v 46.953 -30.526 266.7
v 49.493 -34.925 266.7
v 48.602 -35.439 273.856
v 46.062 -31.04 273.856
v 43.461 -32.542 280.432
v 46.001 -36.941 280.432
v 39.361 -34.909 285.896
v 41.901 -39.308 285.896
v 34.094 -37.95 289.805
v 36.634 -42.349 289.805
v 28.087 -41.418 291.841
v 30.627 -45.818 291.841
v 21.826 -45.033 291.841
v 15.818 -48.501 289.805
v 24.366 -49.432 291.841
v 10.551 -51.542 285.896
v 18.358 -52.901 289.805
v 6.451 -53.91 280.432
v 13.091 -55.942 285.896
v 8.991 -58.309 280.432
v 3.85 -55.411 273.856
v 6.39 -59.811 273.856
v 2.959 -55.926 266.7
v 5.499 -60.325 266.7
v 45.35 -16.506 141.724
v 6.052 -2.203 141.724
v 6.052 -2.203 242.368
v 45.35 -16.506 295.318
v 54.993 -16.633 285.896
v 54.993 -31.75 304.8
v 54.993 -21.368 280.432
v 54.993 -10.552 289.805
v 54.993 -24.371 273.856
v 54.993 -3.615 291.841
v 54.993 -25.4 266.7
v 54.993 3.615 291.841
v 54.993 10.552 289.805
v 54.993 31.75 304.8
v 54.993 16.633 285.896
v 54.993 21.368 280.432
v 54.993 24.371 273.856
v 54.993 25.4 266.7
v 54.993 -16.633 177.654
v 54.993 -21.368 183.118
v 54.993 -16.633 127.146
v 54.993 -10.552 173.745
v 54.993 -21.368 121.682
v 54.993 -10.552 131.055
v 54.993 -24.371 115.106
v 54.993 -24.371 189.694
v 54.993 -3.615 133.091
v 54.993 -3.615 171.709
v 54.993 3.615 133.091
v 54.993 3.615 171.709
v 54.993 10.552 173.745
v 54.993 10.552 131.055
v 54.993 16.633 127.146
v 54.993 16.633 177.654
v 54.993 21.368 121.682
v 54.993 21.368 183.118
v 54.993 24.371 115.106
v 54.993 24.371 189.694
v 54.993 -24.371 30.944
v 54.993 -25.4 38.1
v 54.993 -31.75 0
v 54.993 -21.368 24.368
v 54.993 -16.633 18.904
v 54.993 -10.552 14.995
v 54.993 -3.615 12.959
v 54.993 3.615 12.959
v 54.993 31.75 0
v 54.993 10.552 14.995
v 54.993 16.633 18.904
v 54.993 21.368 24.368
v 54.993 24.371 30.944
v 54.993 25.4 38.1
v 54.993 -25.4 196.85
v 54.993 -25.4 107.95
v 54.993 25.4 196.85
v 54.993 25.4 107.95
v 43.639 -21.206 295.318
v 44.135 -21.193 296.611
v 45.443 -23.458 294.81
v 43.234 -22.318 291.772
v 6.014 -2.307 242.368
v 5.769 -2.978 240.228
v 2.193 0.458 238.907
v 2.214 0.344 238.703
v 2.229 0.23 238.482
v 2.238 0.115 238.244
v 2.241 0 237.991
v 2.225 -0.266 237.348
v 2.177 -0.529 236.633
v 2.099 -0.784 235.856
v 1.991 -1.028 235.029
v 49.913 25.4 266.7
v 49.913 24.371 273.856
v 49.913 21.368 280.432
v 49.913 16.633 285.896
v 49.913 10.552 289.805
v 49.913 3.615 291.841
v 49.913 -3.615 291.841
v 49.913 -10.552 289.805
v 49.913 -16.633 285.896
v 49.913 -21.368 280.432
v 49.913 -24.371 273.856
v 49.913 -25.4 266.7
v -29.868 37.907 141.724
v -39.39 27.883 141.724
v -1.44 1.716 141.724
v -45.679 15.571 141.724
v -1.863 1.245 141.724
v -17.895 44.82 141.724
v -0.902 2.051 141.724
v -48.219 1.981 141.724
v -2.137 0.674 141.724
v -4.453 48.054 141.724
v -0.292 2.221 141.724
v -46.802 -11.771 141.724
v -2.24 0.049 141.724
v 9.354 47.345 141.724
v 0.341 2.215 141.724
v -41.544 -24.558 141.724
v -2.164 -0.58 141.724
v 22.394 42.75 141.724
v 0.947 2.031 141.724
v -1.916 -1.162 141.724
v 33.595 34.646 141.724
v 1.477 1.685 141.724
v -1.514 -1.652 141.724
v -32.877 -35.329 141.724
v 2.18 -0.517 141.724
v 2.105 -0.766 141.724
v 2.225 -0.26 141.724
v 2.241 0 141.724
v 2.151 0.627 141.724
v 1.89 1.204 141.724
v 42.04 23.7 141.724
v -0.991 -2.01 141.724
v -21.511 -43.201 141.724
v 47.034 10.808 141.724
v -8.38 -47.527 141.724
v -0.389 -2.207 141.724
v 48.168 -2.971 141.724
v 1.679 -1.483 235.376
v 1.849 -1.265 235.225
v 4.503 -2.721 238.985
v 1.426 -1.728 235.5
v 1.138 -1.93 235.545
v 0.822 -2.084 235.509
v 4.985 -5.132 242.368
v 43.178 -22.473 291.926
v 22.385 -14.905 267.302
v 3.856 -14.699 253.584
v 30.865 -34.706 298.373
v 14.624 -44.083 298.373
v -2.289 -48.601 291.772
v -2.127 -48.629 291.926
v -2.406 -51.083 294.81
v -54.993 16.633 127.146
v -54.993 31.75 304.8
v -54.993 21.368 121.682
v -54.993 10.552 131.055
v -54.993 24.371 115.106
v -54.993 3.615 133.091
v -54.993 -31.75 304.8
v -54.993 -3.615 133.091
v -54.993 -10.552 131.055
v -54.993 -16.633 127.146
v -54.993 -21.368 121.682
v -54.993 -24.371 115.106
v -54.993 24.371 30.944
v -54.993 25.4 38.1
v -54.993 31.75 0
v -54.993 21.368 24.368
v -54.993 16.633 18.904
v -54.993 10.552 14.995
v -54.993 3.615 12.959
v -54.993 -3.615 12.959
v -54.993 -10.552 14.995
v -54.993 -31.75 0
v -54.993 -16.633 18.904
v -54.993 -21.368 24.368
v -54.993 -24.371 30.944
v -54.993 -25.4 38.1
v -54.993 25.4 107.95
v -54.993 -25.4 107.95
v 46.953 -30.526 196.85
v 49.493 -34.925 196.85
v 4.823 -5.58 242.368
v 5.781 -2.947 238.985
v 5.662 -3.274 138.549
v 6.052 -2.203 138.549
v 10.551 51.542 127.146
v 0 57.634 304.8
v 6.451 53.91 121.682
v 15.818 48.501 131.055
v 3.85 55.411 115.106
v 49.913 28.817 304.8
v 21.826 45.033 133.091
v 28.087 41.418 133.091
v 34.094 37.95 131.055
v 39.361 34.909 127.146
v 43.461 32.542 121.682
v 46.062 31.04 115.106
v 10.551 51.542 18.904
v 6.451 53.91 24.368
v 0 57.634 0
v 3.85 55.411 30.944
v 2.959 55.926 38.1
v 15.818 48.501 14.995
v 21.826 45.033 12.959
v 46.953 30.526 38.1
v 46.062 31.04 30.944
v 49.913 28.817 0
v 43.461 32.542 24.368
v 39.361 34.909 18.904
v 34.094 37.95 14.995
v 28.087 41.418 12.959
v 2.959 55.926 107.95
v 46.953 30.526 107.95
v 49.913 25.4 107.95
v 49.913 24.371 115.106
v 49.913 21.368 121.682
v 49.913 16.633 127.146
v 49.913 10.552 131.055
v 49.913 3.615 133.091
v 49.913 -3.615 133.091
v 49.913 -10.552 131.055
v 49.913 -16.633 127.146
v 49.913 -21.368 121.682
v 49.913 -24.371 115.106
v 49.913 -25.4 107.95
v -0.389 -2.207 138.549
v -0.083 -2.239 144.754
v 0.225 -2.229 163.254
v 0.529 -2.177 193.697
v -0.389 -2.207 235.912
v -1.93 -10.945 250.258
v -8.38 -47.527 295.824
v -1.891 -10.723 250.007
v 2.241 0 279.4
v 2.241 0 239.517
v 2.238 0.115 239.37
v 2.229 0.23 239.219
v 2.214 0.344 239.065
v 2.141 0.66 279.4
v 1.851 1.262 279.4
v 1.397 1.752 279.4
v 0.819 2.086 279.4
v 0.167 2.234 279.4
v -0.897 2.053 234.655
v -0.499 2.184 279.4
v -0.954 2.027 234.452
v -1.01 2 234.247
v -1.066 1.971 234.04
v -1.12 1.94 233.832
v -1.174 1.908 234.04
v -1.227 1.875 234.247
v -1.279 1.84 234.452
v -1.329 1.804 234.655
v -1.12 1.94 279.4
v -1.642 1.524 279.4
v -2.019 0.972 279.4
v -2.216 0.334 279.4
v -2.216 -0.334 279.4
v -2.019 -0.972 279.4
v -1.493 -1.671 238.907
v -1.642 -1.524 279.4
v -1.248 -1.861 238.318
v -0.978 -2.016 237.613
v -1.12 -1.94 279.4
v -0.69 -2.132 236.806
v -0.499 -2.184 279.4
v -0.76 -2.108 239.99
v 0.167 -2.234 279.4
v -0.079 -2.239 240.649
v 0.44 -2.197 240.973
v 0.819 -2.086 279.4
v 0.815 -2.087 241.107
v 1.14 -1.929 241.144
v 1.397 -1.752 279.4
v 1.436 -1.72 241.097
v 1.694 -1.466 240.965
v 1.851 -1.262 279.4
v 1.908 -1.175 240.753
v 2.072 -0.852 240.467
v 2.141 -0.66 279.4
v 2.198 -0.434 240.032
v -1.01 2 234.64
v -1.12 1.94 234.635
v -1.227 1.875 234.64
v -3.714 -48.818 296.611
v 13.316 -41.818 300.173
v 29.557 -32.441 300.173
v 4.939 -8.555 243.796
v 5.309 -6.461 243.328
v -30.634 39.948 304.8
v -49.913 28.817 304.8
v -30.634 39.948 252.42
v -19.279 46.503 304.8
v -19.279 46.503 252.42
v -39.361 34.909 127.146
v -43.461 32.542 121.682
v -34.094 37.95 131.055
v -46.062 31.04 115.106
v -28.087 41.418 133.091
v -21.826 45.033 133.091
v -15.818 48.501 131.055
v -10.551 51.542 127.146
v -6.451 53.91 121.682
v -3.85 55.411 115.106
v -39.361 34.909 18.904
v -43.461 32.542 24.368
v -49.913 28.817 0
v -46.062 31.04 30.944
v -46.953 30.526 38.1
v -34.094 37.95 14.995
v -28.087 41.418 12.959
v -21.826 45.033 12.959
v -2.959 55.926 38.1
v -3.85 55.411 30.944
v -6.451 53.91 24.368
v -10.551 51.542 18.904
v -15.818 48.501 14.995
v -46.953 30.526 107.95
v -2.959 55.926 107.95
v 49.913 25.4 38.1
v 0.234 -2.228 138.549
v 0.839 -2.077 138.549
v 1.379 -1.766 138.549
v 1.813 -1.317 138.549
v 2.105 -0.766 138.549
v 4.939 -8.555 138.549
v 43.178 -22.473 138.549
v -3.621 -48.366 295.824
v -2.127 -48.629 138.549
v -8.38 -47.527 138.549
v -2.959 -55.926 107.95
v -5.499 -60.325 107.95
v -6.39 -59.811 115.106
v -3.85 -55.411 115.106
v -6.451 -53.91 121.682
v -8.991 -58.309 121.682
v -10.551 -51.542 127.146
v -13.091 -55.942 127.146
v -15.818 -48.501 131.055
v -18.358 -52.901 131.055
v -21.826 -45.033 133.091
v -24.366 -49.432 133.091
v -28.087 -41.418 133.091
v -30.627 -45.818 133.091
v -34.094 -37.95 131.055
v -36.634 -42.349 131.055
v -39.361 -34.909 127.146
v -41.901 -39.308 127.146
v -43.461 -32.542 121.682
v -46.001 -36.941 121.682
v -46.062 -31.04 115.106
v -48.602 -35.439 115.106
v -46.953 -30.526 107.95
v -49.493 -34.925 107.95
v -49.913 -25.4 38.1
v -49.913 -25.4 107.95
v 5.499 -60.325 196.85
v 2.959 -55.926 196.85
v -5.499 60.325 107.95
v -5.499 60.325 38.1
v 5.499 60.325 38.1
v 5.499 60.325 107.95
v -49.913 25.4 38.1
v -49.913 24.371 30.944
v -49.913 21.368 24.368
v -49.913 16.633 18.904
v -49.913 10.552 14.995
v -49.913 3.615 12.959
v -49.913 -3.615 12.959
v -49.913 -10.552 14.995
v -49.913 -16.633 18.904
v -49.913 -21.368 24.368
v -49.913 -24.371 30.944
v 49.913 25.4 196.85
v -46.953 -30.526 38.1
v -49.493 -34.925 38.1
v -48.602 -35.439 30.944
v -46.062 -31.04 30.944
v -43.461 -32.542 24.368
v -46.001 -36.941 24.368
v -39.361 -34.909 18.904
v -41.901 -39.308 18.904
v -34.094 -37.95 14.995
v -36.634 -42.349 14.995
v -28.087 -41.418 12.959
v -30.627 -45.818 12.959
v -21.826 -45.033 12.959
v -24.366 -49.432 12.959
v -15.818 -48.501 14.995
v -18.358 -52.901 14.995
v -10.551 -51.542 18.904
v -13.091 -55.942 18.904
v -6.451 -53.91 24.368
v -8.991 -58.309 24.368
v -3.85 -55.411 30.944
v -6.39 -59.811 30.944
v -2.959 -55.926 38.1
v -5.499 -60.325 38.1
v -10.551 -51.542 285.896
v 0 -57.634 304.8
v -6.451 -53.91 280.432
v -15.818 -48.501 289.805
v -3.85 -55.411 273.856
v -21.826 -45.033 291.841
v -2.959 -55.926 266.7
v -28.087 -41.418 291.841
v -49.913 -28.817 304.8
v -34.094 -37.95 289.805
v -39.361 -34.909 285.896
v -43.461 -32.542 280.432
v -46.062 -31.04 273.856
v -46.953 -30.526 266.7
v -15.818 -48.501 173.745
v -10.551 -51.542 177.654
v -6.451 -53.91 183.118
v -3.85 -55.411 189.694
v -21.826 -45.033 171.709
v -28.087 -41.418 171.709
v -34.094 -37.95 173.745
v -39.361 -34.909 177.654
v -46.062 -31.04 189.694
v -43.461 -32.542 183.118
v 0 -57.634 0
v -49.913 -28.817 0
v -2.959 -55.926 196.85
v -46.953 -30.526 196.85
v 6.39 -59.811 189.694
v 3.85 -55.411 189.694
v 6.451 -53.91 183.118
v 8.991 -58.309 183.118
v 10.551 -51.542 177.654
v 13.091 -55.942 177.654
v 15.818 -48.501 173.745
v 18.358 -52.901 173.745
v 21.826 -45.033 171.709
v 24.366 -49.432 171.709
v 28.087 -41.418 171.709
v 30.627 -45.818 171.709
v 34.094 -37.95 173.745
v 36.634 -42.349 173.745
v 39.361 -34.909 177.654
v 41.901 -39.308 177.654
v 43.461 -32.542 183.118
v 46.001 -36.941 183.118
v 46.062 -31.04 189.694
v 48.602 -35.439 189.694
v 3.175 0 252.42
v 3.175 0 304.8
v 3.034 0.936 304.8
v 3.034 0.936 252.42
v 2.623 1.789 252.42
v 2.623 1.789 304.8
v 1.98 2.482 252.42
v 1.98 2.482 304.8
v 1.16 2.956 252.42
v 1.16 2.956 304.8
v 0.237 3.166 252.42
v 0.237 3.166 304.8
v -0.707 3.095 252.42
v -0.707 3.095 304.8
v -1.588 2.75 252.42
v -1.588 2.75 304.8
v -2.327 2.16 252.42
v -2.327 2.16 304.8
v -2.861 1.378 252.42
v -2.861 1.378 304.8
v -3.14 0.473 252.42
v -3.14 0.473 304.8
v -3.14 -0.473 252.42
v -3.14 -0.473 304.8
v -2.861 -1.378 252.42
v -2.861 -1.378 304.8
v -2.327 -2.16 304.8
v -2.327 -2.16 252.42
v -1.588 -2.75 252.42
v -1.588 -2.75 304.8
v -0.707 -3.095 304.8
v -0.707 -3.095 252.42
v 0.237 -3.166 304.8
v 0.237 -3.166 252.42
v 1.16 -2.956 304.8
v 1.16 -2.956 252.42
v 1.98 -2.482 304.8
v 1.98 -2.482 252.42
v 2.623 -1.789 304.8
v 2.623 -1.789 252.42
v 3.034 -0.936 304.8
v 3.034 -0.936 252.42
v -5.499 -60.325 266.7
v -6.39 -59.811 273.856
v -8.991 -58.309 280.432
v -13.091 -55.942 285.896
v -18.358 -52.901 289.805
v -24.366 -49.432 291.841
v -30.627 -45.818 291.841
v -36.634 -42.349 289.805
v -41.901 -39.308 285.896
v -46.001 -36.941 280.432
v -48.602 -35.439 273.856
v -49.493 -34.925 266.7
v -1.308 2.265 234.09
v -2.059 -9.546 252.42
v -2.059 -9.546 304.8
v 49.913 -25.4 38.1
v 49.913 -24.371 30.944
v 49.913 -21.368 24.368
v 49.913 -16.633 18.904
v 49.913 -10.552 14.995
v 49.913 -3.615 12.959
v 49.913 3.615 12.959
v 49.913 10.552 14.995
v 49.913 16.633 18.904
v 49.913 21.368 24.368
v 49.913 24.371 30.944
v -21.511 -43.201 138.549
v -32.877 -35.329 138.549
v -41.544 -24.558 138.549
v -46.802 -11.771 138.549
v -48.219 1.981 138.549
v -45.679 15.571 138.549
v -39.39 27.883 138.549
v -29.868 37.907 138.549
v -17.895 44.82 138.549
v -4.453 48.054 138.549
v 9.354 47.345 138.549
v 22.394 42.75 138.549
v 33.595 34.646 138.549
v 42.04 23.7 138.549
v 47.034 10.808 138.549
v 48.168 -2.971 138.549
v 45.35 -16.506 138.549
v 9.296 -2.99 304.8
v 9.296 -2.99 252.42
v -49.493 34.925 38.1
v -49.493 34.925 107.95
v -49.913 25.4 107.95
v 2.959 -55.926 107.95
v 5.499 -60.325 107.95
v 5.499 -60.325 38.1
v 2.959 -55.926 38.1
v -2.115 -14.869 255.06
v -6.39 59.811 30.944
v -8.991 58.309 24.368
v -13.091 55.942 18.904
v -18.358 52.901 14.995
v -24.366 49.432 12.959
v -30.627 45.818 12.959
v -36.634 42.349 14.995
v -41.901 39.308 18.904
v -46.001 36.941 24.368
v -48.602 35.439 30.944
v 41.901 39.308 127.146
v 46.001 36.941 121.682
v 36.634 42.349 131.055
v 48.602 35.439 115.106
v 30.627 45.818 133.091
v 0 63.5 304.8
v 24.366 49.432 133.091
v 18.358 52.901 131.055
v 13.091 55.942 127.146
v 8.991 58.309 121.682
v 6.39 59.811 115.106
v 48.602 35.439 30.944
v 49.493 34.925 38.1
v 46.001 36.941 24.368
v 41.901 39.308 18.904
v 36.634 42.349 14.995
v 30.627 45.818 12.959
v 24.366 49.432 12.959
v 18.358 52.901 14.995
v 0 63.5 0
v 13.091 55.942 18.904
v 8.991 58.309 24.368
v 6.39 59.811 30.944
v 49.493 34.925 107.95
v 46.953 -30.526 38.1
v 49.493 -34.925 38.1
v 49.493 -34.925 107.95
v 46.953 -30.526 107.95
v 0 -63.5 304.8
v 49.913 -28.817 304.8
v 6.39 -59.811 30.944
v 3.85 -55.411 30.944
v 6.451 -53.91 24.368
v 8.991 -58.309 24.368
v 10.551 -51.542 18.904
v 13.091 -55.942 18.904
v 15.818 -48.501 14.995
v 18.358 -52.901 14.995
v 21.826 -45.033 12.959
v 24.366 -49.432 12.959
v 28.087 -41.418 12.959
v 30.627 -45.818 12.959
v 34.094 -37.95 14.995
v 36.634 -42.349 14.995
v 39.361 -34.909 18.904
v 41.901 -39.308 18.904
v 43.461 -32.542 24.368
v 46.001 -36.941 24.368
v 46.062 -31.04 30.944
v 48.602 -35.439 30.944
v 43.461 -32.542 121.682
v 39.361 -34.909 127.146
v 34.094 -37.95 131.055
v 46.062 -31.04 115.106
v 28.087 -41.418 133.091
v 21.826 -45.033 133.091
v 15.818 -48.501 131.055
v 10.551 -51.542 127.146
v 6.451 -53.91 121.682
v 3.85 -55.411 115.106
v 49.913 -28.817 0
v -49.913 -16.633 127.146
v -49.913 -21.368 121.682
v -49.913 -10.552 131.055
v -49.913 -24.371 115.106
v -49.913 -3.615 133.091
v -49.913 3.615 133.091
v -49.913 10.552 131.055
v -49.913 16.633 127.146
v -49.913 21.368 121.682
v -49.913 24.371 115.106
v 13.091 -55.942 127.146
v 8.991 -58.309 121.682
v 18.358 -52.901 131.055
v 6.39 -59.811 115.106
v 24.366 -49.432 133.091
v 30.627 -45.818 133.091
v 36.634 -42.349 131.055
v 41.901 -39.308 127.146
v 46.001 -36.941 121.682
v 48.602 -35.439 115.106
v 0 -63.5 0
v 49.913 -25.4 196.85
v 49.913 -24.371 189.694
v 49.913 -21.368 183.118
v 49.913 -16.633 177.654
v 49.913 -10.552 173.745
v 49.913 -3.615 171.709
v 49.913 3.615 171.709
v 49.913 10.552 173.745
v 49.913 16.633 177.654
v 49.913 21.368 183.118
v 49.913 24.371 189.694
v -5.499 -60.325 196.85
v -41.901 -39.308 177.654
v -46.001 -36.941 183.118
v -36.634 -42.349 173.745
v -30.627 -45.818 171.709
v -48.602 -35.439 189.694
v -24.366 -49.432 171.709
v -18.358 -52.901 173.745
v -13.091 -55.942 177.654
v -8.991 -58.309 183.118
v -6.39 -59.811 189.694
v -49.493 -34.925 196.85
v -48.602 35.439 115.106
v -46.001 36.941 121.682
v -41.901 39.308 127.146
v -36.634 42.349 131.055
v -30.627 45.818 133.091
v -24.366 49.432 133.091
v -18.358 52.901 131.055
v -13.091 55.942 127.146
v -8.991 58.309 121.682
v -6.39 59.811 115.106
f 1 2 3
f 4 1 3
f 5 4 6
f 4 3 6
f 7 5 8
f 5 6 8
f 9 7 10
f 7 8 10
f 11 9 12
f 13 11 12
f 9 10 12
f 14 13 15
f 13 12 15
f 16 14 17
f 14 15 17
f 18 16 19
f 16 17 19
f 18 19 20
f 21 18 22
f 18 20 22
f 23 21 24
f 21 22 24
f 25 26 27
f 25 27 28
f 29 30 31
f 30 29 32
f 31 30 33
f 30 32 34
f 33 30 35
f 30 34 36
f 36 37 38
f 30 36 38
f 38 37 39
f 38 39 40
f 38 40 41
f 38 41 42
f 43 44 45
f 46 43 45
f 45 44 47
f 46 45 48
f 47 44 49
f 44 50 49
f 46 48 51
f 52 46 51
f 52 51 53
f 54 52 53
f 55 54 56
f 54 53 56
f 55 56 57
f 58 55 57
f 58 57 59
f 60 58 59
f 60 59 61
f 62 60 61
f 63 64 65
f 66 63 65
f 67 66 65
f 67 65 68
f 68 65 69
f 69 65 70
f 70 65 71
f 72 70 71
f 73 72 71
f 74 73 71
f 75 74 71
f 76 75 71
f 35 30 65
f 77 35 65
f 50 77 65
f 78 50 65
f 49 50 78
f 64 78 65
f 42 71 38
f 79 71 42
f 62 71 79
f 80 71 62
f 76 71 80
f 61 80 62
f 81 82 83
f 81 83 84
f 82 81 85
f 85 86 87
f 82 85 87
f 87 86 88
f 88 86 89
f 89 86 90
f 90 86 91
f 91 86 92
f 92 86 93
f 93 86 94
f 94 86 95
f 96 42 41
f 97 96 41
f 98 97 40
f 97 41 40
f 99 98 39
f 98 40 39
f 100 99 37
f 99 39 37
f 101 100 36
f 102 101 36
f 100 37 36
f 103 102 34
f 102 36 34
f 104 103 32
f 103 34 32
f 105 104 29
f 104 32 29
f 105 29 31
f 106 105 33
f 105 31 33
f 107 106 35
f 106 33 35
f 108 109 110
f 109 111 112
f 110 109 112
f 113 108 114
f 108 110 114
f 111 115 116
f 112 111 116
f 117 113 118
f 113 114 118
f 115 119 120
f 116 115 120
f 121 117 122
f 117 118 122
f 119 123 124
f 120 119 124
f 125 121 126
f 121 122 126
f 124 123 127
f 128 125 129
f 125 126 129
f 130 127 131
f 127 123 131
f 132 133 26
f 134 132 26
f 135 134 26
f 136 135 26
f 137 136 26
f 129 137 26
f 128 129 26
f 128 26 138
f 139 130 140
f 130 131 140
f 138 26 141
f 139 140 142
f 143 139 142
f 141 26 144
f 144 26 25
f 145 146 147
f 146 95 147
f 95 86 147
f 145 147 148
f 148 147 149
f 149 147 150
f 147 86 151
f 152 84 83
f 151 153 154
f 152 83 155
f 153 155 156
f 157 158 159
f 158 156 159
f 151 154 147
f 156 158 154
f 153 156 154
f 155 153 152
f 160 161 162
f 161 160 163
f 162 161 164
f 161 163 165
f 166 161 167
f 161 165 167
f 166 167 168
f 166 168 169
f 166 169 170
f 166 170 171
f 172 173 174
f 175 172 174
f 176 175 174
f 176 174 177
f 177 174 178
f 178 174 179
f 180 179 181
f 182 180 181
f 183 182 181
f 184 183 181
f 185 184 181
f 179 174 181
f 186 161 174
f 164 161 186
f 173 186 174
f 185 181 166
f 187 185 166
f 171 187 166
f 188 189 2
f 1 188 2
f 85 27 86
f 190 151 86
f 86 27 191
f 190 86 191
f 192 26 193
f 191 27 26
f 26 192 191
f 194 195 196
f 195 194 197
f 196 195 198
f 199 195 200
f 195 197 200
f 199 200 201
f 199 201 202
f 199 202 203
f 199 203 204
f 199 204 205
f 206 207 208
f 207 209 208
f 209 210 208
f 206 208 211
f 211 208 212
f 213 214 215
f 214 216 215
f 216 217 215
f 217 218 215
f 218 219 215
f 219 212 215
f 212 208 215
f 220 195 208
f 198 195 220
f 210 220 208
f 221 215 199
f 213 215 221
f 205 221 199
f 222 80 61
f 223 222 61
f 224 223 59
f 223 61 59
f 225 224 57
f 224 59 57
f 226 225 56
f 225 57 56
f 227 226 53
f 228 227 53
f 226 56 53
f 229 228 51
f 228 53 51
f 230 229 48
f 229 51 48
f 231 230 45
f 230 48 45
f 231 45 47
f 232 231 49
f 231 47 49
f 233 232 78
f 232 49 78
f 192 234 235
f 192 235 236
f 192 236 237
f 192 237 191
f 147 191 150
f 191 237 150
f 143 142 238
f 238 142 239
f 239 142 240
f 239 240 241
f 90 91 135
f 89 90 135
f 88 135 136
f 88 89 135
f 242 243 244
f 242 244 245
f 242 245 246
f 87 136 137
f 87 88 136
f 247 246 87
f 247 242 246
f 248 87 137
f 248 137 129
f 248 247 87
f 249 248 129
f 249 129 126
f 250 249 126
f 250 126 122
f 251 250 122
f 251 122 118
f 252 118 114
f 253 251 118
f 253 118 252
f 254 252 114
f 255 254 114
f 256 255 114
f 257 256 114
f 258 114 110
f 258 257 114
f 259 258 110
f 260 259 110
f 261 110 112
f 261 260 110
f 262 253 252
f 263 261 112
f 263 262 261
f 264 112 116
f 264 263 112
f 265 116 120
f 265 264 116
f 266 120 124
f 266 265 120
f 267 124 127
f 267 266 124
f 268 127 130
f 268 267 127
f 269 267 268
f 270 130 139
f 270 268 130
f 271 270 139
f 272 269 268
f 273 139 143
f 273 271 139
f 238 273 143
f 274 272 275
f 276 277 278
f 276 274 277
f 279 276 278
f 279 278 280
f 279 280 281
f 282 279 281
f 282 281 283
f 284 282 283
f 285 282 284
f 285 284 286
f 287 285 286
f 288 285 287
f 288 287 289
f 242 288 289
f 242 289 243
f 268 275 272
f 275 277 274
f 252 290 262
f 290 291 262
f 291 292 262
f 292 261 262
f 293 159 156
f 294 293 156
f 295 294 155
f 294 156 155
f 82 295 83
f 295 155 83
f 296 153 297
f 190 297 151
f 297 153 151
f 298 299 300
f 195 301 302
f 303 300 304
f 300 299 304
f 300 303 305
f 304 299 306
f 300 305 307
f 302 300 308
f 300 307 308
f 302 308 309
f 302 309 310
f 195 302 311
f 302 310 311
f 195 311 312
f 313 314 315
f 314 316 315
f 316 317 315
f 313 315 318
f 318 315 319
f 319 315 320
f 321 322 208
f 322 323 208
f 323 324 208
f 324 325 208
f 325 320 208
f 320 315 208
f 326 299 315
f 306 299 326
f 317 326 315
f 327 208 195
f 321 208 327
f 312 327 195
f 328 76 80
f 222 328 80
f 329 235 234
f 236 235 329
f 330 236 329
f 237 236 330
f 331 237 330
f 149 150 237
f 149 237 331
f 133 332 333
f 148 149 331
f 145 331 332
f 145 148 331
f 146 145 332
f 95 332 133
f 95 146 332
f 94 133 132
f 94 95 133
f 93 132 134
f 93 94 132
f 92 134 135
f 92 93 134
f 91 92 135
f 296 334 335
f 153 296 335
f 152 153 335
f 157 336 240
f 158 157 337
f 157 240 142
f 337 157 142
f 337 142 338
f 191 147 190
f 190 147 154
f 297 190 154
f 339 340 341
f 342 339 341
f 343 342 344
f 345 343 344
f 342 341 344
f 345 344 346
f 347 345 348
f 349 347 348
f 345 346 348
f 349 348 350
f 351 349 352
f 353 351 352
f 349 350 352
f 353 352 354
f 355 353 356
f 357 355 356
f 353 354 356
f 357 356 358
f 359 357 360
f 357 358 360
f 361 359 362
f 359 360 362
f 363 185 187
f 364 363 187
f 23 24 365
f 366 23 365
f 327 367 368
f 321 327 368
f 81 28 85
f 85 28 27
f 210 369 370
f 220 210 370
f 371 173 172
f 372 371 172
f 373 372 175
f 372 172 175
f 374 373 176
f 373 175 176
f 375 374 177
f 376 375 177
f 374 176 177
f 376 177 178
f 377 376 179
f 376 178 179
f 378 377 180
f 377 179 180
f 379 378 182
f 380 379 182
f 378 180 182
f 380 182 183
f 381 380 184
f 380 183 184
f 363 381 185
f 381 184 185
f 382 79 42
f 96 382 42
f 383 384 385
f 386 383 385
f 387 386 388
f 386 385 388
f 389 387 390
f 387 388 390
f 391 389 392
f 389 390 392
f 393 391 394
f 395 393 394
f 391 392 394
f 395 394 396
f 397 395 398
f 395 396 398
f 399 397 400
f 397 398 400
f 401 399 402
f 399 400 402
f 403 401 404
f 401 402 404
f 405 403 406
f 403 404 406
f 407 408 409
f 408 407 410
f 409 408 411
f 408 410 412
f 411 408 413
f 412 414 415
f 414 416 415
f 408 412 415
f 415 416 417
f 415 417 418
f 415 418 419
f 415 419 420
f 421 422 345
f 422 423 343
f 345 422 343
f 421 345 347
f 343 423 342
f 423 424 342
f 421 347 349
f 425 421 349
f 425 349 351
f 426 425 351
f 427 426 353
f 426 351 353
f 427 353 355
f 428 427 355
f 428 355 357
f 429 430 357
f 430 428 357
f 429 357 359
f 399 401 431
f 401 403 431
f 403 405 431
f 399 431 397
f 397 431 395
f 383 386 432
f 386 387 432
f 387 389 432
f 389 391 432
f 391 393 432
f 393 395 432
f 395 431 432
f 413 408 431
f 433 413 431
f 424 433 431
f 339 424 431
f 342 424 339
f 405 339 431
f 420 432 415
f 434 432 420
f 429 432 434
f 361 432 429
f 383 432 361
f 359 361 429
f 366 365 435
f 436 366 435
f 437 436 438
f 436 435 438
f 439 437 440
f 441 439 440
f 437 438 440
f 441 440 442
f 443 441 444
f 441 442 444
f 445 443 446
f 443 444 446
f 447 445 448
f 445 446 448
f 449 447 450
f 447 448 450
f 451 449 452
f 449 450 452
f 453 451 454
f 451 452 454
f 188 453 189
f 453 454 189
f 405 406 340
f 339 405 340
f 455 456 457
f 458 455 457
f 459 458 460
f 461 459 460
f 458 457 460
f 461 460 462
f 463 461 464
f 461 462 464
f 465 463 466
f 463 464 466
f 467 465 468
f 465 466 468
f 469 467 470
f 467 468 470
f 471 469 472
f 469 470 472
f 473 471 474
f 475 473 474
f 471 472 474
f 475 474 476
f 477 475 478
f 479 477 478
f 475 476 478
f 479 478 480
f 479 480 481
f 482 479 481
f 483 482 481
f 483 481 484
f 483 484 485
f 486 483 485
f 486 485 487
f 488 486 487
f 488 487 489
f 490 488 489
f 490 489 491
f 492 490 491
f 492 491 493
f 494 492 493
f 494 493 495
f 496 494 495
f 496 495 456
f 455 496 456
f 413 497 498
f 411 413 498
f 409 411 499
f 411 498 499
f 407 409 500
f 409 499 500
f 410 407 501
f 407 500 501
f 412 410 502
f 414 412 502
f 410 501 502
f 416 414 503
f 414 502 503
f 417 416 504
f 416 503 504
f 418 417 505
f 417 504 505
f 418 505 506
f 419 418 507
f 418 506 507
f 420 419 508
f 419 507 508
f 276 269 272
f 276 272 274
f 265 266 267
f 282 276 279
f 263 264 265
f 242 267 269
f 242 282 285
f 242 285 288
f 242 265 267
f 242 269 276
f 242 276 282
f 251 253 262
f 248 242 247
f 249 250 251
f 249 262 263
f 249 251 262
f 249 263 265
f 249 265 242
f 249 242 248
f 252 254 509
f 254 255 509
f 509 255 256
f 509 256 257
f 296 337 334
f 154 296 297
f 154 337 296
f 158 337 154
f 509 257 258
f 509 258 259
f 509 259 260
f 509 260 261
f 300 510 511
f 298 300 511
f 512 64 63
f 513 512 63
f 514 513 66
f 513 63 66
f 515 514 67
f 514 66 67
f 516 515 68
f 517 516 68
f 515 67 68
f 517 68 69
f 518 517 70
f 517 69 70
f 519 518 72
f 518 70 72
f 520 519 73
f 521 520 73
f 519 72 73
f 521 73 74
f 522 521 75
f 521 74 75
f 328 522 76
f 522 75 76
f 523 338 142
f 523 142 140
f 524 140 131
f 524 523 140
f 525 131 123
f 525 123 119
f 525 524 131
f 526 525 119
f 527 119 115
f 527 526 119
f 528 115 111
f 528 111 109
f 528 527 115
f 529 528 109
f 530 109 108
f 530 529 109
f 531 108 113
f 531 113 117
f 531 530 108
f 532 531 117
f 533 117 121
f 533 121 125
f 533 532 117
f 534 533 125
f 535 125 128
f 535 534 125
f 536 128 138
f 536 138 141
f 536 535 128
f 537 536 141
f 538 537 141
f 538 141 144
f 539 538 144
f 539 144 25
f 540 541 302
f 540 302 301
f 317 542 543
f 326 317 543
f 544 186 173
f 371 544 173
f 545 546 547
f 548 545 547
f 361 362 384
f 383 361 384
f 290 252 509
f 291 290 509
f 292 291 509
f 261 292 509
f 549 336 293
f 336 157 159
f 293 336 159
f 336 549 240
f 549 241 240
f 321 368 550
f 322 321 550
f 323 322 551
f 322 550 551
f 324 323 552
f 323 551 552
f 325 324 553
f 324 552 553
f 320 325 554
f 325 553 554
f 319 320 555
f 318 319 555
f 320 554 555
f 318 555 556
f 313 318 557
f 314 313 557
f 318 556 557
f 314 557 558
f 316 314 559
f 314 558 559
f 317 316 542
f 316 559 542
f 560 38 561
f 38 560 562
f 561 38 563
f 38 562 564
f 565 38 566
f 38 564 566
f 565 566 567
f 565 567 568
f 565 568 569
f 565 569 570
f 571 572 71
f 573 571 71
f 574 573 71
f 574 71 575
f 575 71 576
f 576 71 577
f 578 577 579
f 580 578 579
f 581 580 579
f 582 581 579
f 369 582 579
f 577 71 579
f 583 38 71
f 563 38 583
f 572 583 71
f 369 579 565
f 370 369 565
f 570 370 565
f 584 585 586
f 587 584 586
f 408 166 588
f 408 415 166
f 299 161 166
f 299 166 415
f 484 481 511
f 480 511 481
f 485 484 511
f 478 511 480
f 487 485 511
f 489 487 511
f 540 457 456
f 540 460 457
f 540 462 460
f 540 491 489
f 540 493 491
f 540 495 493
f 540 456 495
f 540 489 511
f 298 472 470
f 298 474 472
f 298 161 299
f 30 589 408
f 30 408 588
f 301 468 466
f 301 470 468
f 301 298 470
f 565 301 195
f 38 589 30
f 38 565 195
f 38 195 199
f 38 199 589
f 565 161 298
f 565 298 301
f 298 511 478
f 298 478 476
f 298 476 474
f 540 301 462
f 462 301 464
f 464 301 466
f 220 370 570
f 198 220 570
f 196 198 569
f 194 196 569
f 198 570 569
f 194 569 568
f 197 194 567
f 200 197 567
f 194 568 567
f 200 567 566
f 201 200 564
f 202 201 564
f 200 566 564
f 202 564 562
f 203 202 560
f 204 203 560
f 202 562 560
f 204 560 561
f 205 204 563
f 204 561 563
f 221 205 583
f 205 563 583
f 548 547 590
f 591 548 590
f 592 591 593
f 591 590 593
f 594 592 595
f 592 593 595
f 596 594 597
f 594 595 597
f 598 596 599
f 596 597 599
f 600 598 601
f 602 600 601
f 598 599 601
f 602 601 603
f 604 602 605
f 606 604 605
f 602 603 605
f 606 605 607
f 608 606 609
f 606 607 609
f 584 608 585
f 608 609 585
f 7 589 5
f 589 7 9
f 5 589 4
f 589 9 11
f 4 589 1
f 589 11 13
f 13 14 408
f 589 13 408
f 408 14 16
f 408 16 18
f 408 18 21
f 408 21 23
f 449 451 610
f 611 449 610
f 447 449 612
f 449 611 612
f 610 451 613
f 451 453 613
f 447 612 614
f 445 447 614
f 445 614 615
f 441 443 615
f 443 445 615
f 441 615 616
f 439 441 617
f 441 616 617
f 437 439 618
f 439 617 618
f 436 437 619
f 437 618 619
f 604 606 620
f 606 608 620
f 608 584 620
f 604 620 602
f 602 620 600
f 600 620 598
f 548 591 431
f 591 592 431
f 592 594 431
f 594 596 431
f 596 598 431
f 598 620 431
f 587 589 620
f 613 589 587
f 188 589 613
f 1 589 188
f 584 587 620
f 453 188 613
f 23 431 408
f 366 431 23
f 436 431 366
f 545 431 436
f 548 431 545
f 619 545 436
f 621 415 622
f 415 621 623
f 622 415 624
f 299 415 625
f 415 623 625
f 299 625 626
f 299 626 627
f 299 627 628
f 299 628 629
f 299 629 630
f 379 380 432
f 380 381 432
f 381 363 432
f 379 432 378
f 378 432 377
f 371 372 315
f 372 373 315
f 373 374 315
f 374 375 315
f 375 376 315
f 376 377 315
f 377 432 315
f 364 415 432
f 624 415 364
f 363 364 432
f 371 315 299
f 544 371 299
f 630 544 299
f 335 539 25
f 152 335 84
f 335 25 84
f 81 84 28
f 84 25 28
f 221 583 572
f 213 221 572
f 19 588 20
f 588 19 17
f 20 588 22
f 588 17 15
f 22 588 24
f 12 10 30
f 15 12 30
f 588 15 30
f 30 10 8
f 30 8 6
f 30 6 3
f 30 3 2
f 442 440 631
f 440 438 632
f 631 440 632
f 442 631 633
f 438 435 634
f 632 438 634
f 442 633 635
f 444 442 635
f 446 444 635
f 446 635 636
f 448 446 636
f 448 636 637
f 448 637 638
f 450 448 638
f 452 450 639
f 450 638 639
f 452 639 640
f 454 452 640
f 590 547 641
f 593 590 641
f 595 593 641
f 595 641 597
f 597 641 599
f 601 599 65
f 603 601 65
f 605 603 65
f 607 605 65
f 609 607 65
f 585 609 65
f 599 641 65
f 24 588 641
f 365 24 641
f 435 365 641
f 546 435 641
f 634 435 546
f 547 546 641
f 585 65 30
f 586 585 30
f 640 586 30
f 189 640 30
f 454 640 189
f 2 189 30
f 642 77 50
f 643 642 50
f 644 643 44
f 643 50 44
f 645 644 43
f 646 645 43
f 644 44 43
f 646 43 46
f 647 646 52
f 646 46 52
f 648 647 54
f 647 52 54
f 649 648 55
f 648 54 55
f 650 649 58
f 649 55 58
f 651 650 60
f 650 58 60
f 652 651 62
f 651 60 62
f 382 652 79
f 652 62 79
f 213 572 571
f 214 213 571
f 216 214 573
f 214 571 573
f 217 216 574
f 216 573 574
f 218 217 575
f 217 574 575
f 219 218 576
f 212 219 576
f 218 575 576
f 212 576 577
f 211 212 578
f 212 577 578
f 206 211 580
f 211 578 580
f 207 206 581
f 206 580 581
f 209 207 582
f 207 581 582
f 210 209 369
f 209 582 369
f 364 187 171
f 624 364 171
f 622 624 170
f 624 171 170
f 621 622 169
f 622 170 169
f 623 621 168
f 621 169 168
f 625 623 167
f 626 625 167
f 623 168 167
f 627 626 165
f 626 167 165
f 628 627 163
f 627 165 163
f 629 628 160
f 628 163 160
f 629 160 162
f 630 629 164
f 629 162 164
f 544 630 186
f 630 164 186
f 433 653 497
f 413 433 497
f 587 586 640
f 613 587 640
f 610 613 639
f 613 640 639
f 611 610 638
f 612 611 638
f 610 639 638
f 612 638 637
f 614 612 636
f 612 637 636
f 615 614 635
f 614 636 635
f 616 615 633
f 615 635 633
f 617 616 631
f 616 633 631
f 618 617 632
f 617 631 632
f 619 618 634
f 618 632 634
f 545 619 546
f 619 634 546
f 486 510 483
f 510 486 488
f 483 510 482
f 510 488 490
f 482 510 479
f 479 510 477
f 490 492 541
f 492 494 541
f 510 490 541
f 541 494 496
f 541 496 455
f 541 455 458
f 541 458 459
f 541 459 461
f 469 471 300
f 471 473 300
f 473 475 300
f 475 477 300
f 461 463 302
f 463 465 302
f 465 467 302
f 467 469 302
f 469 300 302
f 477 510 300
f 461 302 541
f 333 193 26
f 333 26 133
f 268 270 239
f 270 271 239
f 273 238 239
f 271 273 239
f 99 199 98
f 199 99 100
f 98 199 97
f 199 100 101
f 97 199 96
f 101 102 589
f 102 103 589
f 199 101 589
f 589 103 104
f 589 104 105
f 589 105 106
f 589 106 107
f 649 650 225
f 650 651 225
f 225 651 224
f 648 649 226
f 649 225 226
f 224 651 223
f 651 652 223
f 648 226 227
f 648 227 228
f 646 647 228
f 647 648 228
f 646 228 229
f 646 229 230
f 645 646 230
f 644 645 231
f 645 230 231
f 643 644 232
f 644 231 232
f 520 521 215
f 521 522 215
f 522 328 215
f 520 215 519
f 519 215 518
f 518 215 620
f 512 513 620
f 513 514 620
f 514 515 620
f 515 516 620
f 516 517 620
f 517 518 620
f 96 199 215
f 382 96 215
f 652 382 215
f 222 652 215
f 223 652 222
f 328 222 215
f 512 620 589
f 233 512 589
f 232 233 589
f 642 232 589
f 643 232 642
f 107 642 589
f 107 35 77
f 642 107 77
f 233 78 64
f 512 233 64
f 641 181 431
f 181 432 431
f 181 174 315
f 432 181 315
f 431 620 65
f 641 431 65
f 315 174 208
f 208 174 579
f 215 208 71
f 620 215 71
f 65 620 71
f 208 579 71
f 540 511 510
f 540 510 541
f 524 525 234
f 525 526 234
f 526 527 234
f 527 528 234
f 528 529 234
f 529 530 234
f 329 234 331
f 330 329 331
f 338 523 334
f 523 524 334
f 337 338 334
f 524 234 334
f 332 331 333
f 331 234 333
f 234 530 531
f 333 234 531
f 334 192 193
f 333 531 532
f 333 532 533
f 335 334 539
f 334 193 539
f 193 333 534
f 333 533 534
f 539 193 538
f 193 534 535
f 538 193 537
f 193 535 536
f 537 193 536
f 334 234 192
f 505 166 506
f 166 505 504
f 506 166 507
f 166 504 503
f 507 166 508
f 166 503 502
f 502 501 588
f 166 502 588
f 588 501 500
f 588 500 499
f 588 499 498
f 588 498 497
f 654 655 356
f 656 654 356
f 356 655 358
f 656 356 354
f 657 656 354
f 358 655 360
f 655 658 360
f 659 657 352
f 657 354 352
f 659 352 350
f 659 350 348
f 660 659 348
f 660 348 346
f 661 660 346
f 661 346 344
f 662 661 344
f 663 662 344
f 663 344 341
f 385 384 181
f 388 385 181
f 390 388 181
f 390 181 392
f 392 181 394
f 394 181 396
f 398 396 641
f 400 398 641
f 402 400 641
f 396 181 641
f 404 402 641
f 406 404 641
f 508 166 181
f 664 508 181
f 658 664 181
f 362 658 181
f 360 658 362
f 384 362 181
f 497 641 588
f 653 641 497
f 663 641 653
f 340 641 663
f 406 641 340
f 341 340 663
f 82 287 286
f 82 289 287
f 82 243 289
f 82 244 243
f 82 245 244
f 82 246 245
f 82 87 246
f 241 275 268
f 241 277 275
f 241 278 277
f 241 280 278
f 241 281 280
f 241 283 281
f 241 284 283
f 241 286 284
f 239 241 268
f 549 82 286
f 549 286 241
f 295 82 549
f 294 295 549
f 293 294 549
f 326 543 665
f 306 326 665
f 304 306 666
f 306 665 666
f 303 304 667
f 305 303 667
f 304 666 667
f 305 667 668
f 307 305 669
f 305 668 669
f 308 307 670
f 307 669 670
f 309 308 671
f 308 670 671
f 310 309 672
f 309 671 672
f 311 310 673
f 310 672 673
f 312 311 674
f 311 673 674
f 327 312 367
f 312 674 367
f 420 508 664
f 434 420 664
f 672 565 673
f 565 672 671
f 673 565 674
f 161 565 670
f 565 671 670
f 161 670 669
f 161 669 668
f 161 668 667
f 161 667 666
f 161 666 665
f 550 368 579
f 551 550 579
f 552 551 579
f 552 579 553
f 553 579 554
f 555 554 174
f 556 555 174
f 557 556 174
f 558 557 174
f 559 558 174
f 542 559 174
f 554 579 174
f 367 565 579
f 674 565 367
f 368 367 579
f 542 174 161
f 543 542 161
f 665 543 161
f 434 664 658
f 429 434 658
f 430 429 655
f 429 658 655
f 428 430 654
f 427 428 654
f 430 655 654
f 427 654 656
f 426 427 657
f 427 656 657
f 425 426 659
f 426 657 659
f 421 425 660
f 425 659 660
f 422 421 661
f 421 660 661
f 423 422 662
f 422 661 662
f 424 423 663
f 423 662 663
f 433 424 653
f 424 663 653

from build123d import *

# Parameters (mm, degrees)
F1_DEPTH  = 304.8
F7_DEPTH  = 3.175
F8_W      = 13.1115056574
F8_H      = 52.3799322128
F9_DEPTH  = 57.15
F10_R     = 3.175
F11_DEPTH = 304.801
F13_START = -25.4
F12_R     = 2.2405859804
F13_DEPTH = 140.85123
F15_DEPTH = 5.08
F17_DEPTH = 5.08
F19_DEPTH = 5.08
F21_DEPTH = 3.175
F23_DEPTH = 6.35
F25_DEPTH = 6.35
F27_DEPTH = 5.08
F29_DEPTH = 5.08
F31_DEPTH = 5.08


with BuildPart() as f1:
    # F0 (on Top) → F1 (new body)
    with BuildSketch(Plane.XY):
        Polygon((-54.9926131403, 31.75), (-54.9926131403, 0), (-54.9926131403, -31.75), (0, -63.5), (54.9926131403, -31.75), (54.9926131403, 0), (54.9926131403, 31.75), (0, 63.5), align=None)
        Polygon((-49.9126131403, -28.8170606325), (-49.9126131403, 0), (-49.9126131403, 28.8170606325), (0, 57.634121265), (49.9126131403, 28.8170606325), (49.9126131403, 0), (49.9126131403, -28.8170606325), (0, -57.634121265), align=None, mode=Mode.SUBTRACT)
    extrude(amount=F1_DEPTH)

    # F8 (on face) → F9 (join)
    with BuildSketch(Plane(origin=(-24.9563065702, 43.2255909488, 0), x_dir=(0.8660254038, 0.5, 0), z_dir=(0.5, -0.8660254038, 0))):
        with Locations((0, 278.6100338936)):
            Rectangle(F8_W, F8_H)
    extrude(amount=F9_DEPTH)

    # F10 (on face) → F11 (cut, through all)
    with BuildSketch(Plane.XY.offset(304.8)):
        Circle(F10_R)
    extrude(amount=-F11_DEPTH, mode=Mode.SUBTRACT)

    # F14 (on face) → F15 (cut, through all)
    with BuildSketch(Plane.YZ.offset(54.9926131403)):
        with BuildLine():
            ThreePointArc((25.4, 266.7), (0, 292.1), (-25.4, 266.7))
            Line((-25.4, 266.7), (-25.4, 196.85))
            ThreePointArc((-25.4, 196.85), (0, 171.45), (25.4, 196.85))
            Line((25.4, 196.85), (25.4, 266.7))
        make_face()
        with BuildLine():
            ThreePointArc((25.4, 107.95), (0, 133.35), (-25.4, 107.95))
            Line((-25.4, 107.95), (-25.4, 38.1))
            ThreePointArc((-25.4, 38.1), (0, 12.7), (25.4, 38.1))
            Line((25.4, 38.1), (25.4, 107.95))
        make_face()
    extrude(amount=-F15_DEPTH, mode=Mode.SUBTRACT)

    # F16 (on face) → F17 (cut, through all)
    with BuildSketch(Plane(origin=(27.4963065702, -47.625, 0), x_dir=(0.8660254038, 0.5, 0), z_dir=(0.5, -0.8660254038, 0))):
        with BuildLine():
            ThreePointArc((25.4, 266.7), (0, 292.1), (-25.4, 266.7))
            Line((-25.4, 266.7), (-25.4, 196.85))
            ThreePointArc((-25.4, 196.85), (0, 171.45), (25.4, 196.85))
            Line((25.4, 196.85), (25.4, 266.7))
        make_face()
        with BuildLine():
            Line((25.4, 38.1), (25.4, 107.95))
            ThreePointArc((25.4, 107.95), (0, 133.35), (-25.4, 107.95))
            Line((-25.4, 107.95), (-25.4, 38.1))
            ThreePointArc((-25.4, 38.1), (0, 12.7), (25.4, 38.1))
        make_face()
    extrude(amount=-F17_DEPTH, mode=Mode.SUBTRACT)

    # F18 (on face) → F19 (cut, through all)
    with BuildSketch(Plane(origin=(-27.4963065702, -47.625, 0), x_dir=(0.8660254038, -0.5, 0), z_dir=(-0.5, -0.8660254038, 0))):
        with BuildLine():
            ThreePointArc((25.4, 266.7), (0, 292.1), (-25.4, 266.7))
            Line((-25.4, 266.7), (-25.4, 196.85))
            ThreePointArc((-25.4, 196.85), (0, 171.45), (25.4, 196.85))
            Line((25.4, 196.85), (25.4, 266.7))
        make_face()
        with BuildLine():
            ThreePointArc((25.4, 107.95), (0, 133.35), (-25.4, 107.95))
            Line((-25.4, 107.95), (-25.4, 38.1))
            ThreePointArc((-25.4, 38.1), (0, 12.7), (25.4, 38.1))
            Line((25.4, 38.1), (25.4, 107.95))
        make_face()
    extrude(amount=-F19_DEPTH, mode=Mode.SUBTRACT)

    # F26 (on face) → F27 (cut, through all)
    with BuildSketch(Plane(origin=(27.4963065702, 47.625, 0), x_dir=(-0.8660254038, 0.5, 0), z_dir=(0.5, 0.8660254038, 0))):
        with BuildLine():
            ThreePointArc((25.4, 107.95), (0, 133.35), (-25.4, 107.95))
            Line((-25.4, 107.95), (-25.4, 38.1))
            ThreePointArc((-25.4, 38.1), (0, 12.7), (25.4, 38.1))
            Line((25.4, 38.1), (25.4, 107.95))
        make_face()
    extrude(amount=-F27_DEPTH, mode=Mode.SUBTRACT)

    # F28 (on face) → F29 (cut, through all)
    with BuildSketch(Plane(origin=(-27.4963065702, 47.625, 0), x_dir=(-0.8660254038, -0.5, 0), z_dir=(-0.5, 0.8660254038, 0))):
        with BuildLine():
            Line((-25.4, 107.95), (-25.4, 38.1))
            ThreePointArc((-25.4, 38.1), (0, 12.7), (25.4, 38.1))
            Line((25.4, 38.1), (25.4, 107.95))
            ThreePointArc((25.4, 107.95), (0, 133.35), (-25.4, 107.95))
        make_face()
    extrude(amount=-F29_DEPTH, mode=Mode.SUBTRACT)

    # F30 (on face) → F31 (cut, through all)
    with BuildSketch(Plane(origin=(-54.9926131403, 0, 0), x_dir=(0, -1, 0), z_dir=(-1, 0, 0))):
        with BuildLine():
            Line((-25.4, 107.95), (-25.4, 38.1))
            ThreePointArc((-25.4, 38.1), (0, 12.7), (25.4, 38.1))
            Line((25.4, 38.1), (25.4, 107.95))
            ThreePointArc((25.4, 107.95), (0, 133.35), (-25.4, 107.95))
        make_face()
    extrude(amount=-F31_DEPTH, mode=Mode.SUBTRACT)


with BuildPart() as f7:
    # F6 (on 3pt) → F7 (new body)
    with BuildSketch(Plane(origin=(-54.2456154711, 93.9561620838, 74.6804273717), x_dir=(-0.9112486735, -0.3224153931, -0.25626972), z_dir=(-0.4118565953, 0.7133565484, 0.567006684))):
        with BuildLine():
            Line((-59.528882784, 181.8445044933), (-56.8881433905, 262.573325118))
            ThreePointArc((-56.8881433905, 262.573325118), (-84.6582822631, 258.6079675849), (-109.3974446881, 245.383803495))
            Line((-109.3974446881, 245.383803495), (-59.528882784, 181.8445044933))
        make_face()
    extrude(amount=F7_DEPTH)

    # F12 (on face) → F13 (join)
    with BuildSketch(Plane.XY.offset(304.8).offset(F13_START)):
        Circle(F12_R)
    extrude(amount=-F13_DEPTH)

    # F20 (on face) → F21 (join)
    with BuildSketch(Plane(origin=(0, 0, 138.54877), x_dir=(1, 0, 0), z_dir=(0, 0, -1))):
        with BuildLine():
            ThreePointArc((-8.3802610542, 47.5268221604), (-24.13, -41.7943859866), (45.3495658791, 16.5058921169))
            Line((45.3495658791, 16.5058921169), (0, 0))
            Line((0, 0), (-8.3802610542, 47.5268221604))
        make_face()
    extrude(amount=-F21_DEPTH)

    # F22 (on face) → F23 (join)
    with BuildSketch(Plane(origin=(0, 0, 0), x_dir=(0.1736481777, 0.984807753, 0), z_dir=(0.984807753, -0.1736481777, 0))):
        Polygon((-48.26, 295.8237826824), (-48.26, 138.54877), (-2.2405859804, 138.54877), (-1.8979018787, 238.9846593142), align=None)
    extrude(amount=F23_DEPTH)

    # F24 (on face) → F25 (join)
    with BuildSketch(Plane(origin=(0, 0, 0), x_dir=(0.9396926208, -0.3420201433, 0), z_dir=(-0.3420201433, -0.9396926208, 0))):
        Polygon((6.4400737174, 138.54877), (48.26, 138.54877), (48.26, 295.3179776669), (6.4400737174, 242.3680126667), align=None)
    extrude(amount=F25_DEPTH)


solid = Compound([f1.part, f7.part])
